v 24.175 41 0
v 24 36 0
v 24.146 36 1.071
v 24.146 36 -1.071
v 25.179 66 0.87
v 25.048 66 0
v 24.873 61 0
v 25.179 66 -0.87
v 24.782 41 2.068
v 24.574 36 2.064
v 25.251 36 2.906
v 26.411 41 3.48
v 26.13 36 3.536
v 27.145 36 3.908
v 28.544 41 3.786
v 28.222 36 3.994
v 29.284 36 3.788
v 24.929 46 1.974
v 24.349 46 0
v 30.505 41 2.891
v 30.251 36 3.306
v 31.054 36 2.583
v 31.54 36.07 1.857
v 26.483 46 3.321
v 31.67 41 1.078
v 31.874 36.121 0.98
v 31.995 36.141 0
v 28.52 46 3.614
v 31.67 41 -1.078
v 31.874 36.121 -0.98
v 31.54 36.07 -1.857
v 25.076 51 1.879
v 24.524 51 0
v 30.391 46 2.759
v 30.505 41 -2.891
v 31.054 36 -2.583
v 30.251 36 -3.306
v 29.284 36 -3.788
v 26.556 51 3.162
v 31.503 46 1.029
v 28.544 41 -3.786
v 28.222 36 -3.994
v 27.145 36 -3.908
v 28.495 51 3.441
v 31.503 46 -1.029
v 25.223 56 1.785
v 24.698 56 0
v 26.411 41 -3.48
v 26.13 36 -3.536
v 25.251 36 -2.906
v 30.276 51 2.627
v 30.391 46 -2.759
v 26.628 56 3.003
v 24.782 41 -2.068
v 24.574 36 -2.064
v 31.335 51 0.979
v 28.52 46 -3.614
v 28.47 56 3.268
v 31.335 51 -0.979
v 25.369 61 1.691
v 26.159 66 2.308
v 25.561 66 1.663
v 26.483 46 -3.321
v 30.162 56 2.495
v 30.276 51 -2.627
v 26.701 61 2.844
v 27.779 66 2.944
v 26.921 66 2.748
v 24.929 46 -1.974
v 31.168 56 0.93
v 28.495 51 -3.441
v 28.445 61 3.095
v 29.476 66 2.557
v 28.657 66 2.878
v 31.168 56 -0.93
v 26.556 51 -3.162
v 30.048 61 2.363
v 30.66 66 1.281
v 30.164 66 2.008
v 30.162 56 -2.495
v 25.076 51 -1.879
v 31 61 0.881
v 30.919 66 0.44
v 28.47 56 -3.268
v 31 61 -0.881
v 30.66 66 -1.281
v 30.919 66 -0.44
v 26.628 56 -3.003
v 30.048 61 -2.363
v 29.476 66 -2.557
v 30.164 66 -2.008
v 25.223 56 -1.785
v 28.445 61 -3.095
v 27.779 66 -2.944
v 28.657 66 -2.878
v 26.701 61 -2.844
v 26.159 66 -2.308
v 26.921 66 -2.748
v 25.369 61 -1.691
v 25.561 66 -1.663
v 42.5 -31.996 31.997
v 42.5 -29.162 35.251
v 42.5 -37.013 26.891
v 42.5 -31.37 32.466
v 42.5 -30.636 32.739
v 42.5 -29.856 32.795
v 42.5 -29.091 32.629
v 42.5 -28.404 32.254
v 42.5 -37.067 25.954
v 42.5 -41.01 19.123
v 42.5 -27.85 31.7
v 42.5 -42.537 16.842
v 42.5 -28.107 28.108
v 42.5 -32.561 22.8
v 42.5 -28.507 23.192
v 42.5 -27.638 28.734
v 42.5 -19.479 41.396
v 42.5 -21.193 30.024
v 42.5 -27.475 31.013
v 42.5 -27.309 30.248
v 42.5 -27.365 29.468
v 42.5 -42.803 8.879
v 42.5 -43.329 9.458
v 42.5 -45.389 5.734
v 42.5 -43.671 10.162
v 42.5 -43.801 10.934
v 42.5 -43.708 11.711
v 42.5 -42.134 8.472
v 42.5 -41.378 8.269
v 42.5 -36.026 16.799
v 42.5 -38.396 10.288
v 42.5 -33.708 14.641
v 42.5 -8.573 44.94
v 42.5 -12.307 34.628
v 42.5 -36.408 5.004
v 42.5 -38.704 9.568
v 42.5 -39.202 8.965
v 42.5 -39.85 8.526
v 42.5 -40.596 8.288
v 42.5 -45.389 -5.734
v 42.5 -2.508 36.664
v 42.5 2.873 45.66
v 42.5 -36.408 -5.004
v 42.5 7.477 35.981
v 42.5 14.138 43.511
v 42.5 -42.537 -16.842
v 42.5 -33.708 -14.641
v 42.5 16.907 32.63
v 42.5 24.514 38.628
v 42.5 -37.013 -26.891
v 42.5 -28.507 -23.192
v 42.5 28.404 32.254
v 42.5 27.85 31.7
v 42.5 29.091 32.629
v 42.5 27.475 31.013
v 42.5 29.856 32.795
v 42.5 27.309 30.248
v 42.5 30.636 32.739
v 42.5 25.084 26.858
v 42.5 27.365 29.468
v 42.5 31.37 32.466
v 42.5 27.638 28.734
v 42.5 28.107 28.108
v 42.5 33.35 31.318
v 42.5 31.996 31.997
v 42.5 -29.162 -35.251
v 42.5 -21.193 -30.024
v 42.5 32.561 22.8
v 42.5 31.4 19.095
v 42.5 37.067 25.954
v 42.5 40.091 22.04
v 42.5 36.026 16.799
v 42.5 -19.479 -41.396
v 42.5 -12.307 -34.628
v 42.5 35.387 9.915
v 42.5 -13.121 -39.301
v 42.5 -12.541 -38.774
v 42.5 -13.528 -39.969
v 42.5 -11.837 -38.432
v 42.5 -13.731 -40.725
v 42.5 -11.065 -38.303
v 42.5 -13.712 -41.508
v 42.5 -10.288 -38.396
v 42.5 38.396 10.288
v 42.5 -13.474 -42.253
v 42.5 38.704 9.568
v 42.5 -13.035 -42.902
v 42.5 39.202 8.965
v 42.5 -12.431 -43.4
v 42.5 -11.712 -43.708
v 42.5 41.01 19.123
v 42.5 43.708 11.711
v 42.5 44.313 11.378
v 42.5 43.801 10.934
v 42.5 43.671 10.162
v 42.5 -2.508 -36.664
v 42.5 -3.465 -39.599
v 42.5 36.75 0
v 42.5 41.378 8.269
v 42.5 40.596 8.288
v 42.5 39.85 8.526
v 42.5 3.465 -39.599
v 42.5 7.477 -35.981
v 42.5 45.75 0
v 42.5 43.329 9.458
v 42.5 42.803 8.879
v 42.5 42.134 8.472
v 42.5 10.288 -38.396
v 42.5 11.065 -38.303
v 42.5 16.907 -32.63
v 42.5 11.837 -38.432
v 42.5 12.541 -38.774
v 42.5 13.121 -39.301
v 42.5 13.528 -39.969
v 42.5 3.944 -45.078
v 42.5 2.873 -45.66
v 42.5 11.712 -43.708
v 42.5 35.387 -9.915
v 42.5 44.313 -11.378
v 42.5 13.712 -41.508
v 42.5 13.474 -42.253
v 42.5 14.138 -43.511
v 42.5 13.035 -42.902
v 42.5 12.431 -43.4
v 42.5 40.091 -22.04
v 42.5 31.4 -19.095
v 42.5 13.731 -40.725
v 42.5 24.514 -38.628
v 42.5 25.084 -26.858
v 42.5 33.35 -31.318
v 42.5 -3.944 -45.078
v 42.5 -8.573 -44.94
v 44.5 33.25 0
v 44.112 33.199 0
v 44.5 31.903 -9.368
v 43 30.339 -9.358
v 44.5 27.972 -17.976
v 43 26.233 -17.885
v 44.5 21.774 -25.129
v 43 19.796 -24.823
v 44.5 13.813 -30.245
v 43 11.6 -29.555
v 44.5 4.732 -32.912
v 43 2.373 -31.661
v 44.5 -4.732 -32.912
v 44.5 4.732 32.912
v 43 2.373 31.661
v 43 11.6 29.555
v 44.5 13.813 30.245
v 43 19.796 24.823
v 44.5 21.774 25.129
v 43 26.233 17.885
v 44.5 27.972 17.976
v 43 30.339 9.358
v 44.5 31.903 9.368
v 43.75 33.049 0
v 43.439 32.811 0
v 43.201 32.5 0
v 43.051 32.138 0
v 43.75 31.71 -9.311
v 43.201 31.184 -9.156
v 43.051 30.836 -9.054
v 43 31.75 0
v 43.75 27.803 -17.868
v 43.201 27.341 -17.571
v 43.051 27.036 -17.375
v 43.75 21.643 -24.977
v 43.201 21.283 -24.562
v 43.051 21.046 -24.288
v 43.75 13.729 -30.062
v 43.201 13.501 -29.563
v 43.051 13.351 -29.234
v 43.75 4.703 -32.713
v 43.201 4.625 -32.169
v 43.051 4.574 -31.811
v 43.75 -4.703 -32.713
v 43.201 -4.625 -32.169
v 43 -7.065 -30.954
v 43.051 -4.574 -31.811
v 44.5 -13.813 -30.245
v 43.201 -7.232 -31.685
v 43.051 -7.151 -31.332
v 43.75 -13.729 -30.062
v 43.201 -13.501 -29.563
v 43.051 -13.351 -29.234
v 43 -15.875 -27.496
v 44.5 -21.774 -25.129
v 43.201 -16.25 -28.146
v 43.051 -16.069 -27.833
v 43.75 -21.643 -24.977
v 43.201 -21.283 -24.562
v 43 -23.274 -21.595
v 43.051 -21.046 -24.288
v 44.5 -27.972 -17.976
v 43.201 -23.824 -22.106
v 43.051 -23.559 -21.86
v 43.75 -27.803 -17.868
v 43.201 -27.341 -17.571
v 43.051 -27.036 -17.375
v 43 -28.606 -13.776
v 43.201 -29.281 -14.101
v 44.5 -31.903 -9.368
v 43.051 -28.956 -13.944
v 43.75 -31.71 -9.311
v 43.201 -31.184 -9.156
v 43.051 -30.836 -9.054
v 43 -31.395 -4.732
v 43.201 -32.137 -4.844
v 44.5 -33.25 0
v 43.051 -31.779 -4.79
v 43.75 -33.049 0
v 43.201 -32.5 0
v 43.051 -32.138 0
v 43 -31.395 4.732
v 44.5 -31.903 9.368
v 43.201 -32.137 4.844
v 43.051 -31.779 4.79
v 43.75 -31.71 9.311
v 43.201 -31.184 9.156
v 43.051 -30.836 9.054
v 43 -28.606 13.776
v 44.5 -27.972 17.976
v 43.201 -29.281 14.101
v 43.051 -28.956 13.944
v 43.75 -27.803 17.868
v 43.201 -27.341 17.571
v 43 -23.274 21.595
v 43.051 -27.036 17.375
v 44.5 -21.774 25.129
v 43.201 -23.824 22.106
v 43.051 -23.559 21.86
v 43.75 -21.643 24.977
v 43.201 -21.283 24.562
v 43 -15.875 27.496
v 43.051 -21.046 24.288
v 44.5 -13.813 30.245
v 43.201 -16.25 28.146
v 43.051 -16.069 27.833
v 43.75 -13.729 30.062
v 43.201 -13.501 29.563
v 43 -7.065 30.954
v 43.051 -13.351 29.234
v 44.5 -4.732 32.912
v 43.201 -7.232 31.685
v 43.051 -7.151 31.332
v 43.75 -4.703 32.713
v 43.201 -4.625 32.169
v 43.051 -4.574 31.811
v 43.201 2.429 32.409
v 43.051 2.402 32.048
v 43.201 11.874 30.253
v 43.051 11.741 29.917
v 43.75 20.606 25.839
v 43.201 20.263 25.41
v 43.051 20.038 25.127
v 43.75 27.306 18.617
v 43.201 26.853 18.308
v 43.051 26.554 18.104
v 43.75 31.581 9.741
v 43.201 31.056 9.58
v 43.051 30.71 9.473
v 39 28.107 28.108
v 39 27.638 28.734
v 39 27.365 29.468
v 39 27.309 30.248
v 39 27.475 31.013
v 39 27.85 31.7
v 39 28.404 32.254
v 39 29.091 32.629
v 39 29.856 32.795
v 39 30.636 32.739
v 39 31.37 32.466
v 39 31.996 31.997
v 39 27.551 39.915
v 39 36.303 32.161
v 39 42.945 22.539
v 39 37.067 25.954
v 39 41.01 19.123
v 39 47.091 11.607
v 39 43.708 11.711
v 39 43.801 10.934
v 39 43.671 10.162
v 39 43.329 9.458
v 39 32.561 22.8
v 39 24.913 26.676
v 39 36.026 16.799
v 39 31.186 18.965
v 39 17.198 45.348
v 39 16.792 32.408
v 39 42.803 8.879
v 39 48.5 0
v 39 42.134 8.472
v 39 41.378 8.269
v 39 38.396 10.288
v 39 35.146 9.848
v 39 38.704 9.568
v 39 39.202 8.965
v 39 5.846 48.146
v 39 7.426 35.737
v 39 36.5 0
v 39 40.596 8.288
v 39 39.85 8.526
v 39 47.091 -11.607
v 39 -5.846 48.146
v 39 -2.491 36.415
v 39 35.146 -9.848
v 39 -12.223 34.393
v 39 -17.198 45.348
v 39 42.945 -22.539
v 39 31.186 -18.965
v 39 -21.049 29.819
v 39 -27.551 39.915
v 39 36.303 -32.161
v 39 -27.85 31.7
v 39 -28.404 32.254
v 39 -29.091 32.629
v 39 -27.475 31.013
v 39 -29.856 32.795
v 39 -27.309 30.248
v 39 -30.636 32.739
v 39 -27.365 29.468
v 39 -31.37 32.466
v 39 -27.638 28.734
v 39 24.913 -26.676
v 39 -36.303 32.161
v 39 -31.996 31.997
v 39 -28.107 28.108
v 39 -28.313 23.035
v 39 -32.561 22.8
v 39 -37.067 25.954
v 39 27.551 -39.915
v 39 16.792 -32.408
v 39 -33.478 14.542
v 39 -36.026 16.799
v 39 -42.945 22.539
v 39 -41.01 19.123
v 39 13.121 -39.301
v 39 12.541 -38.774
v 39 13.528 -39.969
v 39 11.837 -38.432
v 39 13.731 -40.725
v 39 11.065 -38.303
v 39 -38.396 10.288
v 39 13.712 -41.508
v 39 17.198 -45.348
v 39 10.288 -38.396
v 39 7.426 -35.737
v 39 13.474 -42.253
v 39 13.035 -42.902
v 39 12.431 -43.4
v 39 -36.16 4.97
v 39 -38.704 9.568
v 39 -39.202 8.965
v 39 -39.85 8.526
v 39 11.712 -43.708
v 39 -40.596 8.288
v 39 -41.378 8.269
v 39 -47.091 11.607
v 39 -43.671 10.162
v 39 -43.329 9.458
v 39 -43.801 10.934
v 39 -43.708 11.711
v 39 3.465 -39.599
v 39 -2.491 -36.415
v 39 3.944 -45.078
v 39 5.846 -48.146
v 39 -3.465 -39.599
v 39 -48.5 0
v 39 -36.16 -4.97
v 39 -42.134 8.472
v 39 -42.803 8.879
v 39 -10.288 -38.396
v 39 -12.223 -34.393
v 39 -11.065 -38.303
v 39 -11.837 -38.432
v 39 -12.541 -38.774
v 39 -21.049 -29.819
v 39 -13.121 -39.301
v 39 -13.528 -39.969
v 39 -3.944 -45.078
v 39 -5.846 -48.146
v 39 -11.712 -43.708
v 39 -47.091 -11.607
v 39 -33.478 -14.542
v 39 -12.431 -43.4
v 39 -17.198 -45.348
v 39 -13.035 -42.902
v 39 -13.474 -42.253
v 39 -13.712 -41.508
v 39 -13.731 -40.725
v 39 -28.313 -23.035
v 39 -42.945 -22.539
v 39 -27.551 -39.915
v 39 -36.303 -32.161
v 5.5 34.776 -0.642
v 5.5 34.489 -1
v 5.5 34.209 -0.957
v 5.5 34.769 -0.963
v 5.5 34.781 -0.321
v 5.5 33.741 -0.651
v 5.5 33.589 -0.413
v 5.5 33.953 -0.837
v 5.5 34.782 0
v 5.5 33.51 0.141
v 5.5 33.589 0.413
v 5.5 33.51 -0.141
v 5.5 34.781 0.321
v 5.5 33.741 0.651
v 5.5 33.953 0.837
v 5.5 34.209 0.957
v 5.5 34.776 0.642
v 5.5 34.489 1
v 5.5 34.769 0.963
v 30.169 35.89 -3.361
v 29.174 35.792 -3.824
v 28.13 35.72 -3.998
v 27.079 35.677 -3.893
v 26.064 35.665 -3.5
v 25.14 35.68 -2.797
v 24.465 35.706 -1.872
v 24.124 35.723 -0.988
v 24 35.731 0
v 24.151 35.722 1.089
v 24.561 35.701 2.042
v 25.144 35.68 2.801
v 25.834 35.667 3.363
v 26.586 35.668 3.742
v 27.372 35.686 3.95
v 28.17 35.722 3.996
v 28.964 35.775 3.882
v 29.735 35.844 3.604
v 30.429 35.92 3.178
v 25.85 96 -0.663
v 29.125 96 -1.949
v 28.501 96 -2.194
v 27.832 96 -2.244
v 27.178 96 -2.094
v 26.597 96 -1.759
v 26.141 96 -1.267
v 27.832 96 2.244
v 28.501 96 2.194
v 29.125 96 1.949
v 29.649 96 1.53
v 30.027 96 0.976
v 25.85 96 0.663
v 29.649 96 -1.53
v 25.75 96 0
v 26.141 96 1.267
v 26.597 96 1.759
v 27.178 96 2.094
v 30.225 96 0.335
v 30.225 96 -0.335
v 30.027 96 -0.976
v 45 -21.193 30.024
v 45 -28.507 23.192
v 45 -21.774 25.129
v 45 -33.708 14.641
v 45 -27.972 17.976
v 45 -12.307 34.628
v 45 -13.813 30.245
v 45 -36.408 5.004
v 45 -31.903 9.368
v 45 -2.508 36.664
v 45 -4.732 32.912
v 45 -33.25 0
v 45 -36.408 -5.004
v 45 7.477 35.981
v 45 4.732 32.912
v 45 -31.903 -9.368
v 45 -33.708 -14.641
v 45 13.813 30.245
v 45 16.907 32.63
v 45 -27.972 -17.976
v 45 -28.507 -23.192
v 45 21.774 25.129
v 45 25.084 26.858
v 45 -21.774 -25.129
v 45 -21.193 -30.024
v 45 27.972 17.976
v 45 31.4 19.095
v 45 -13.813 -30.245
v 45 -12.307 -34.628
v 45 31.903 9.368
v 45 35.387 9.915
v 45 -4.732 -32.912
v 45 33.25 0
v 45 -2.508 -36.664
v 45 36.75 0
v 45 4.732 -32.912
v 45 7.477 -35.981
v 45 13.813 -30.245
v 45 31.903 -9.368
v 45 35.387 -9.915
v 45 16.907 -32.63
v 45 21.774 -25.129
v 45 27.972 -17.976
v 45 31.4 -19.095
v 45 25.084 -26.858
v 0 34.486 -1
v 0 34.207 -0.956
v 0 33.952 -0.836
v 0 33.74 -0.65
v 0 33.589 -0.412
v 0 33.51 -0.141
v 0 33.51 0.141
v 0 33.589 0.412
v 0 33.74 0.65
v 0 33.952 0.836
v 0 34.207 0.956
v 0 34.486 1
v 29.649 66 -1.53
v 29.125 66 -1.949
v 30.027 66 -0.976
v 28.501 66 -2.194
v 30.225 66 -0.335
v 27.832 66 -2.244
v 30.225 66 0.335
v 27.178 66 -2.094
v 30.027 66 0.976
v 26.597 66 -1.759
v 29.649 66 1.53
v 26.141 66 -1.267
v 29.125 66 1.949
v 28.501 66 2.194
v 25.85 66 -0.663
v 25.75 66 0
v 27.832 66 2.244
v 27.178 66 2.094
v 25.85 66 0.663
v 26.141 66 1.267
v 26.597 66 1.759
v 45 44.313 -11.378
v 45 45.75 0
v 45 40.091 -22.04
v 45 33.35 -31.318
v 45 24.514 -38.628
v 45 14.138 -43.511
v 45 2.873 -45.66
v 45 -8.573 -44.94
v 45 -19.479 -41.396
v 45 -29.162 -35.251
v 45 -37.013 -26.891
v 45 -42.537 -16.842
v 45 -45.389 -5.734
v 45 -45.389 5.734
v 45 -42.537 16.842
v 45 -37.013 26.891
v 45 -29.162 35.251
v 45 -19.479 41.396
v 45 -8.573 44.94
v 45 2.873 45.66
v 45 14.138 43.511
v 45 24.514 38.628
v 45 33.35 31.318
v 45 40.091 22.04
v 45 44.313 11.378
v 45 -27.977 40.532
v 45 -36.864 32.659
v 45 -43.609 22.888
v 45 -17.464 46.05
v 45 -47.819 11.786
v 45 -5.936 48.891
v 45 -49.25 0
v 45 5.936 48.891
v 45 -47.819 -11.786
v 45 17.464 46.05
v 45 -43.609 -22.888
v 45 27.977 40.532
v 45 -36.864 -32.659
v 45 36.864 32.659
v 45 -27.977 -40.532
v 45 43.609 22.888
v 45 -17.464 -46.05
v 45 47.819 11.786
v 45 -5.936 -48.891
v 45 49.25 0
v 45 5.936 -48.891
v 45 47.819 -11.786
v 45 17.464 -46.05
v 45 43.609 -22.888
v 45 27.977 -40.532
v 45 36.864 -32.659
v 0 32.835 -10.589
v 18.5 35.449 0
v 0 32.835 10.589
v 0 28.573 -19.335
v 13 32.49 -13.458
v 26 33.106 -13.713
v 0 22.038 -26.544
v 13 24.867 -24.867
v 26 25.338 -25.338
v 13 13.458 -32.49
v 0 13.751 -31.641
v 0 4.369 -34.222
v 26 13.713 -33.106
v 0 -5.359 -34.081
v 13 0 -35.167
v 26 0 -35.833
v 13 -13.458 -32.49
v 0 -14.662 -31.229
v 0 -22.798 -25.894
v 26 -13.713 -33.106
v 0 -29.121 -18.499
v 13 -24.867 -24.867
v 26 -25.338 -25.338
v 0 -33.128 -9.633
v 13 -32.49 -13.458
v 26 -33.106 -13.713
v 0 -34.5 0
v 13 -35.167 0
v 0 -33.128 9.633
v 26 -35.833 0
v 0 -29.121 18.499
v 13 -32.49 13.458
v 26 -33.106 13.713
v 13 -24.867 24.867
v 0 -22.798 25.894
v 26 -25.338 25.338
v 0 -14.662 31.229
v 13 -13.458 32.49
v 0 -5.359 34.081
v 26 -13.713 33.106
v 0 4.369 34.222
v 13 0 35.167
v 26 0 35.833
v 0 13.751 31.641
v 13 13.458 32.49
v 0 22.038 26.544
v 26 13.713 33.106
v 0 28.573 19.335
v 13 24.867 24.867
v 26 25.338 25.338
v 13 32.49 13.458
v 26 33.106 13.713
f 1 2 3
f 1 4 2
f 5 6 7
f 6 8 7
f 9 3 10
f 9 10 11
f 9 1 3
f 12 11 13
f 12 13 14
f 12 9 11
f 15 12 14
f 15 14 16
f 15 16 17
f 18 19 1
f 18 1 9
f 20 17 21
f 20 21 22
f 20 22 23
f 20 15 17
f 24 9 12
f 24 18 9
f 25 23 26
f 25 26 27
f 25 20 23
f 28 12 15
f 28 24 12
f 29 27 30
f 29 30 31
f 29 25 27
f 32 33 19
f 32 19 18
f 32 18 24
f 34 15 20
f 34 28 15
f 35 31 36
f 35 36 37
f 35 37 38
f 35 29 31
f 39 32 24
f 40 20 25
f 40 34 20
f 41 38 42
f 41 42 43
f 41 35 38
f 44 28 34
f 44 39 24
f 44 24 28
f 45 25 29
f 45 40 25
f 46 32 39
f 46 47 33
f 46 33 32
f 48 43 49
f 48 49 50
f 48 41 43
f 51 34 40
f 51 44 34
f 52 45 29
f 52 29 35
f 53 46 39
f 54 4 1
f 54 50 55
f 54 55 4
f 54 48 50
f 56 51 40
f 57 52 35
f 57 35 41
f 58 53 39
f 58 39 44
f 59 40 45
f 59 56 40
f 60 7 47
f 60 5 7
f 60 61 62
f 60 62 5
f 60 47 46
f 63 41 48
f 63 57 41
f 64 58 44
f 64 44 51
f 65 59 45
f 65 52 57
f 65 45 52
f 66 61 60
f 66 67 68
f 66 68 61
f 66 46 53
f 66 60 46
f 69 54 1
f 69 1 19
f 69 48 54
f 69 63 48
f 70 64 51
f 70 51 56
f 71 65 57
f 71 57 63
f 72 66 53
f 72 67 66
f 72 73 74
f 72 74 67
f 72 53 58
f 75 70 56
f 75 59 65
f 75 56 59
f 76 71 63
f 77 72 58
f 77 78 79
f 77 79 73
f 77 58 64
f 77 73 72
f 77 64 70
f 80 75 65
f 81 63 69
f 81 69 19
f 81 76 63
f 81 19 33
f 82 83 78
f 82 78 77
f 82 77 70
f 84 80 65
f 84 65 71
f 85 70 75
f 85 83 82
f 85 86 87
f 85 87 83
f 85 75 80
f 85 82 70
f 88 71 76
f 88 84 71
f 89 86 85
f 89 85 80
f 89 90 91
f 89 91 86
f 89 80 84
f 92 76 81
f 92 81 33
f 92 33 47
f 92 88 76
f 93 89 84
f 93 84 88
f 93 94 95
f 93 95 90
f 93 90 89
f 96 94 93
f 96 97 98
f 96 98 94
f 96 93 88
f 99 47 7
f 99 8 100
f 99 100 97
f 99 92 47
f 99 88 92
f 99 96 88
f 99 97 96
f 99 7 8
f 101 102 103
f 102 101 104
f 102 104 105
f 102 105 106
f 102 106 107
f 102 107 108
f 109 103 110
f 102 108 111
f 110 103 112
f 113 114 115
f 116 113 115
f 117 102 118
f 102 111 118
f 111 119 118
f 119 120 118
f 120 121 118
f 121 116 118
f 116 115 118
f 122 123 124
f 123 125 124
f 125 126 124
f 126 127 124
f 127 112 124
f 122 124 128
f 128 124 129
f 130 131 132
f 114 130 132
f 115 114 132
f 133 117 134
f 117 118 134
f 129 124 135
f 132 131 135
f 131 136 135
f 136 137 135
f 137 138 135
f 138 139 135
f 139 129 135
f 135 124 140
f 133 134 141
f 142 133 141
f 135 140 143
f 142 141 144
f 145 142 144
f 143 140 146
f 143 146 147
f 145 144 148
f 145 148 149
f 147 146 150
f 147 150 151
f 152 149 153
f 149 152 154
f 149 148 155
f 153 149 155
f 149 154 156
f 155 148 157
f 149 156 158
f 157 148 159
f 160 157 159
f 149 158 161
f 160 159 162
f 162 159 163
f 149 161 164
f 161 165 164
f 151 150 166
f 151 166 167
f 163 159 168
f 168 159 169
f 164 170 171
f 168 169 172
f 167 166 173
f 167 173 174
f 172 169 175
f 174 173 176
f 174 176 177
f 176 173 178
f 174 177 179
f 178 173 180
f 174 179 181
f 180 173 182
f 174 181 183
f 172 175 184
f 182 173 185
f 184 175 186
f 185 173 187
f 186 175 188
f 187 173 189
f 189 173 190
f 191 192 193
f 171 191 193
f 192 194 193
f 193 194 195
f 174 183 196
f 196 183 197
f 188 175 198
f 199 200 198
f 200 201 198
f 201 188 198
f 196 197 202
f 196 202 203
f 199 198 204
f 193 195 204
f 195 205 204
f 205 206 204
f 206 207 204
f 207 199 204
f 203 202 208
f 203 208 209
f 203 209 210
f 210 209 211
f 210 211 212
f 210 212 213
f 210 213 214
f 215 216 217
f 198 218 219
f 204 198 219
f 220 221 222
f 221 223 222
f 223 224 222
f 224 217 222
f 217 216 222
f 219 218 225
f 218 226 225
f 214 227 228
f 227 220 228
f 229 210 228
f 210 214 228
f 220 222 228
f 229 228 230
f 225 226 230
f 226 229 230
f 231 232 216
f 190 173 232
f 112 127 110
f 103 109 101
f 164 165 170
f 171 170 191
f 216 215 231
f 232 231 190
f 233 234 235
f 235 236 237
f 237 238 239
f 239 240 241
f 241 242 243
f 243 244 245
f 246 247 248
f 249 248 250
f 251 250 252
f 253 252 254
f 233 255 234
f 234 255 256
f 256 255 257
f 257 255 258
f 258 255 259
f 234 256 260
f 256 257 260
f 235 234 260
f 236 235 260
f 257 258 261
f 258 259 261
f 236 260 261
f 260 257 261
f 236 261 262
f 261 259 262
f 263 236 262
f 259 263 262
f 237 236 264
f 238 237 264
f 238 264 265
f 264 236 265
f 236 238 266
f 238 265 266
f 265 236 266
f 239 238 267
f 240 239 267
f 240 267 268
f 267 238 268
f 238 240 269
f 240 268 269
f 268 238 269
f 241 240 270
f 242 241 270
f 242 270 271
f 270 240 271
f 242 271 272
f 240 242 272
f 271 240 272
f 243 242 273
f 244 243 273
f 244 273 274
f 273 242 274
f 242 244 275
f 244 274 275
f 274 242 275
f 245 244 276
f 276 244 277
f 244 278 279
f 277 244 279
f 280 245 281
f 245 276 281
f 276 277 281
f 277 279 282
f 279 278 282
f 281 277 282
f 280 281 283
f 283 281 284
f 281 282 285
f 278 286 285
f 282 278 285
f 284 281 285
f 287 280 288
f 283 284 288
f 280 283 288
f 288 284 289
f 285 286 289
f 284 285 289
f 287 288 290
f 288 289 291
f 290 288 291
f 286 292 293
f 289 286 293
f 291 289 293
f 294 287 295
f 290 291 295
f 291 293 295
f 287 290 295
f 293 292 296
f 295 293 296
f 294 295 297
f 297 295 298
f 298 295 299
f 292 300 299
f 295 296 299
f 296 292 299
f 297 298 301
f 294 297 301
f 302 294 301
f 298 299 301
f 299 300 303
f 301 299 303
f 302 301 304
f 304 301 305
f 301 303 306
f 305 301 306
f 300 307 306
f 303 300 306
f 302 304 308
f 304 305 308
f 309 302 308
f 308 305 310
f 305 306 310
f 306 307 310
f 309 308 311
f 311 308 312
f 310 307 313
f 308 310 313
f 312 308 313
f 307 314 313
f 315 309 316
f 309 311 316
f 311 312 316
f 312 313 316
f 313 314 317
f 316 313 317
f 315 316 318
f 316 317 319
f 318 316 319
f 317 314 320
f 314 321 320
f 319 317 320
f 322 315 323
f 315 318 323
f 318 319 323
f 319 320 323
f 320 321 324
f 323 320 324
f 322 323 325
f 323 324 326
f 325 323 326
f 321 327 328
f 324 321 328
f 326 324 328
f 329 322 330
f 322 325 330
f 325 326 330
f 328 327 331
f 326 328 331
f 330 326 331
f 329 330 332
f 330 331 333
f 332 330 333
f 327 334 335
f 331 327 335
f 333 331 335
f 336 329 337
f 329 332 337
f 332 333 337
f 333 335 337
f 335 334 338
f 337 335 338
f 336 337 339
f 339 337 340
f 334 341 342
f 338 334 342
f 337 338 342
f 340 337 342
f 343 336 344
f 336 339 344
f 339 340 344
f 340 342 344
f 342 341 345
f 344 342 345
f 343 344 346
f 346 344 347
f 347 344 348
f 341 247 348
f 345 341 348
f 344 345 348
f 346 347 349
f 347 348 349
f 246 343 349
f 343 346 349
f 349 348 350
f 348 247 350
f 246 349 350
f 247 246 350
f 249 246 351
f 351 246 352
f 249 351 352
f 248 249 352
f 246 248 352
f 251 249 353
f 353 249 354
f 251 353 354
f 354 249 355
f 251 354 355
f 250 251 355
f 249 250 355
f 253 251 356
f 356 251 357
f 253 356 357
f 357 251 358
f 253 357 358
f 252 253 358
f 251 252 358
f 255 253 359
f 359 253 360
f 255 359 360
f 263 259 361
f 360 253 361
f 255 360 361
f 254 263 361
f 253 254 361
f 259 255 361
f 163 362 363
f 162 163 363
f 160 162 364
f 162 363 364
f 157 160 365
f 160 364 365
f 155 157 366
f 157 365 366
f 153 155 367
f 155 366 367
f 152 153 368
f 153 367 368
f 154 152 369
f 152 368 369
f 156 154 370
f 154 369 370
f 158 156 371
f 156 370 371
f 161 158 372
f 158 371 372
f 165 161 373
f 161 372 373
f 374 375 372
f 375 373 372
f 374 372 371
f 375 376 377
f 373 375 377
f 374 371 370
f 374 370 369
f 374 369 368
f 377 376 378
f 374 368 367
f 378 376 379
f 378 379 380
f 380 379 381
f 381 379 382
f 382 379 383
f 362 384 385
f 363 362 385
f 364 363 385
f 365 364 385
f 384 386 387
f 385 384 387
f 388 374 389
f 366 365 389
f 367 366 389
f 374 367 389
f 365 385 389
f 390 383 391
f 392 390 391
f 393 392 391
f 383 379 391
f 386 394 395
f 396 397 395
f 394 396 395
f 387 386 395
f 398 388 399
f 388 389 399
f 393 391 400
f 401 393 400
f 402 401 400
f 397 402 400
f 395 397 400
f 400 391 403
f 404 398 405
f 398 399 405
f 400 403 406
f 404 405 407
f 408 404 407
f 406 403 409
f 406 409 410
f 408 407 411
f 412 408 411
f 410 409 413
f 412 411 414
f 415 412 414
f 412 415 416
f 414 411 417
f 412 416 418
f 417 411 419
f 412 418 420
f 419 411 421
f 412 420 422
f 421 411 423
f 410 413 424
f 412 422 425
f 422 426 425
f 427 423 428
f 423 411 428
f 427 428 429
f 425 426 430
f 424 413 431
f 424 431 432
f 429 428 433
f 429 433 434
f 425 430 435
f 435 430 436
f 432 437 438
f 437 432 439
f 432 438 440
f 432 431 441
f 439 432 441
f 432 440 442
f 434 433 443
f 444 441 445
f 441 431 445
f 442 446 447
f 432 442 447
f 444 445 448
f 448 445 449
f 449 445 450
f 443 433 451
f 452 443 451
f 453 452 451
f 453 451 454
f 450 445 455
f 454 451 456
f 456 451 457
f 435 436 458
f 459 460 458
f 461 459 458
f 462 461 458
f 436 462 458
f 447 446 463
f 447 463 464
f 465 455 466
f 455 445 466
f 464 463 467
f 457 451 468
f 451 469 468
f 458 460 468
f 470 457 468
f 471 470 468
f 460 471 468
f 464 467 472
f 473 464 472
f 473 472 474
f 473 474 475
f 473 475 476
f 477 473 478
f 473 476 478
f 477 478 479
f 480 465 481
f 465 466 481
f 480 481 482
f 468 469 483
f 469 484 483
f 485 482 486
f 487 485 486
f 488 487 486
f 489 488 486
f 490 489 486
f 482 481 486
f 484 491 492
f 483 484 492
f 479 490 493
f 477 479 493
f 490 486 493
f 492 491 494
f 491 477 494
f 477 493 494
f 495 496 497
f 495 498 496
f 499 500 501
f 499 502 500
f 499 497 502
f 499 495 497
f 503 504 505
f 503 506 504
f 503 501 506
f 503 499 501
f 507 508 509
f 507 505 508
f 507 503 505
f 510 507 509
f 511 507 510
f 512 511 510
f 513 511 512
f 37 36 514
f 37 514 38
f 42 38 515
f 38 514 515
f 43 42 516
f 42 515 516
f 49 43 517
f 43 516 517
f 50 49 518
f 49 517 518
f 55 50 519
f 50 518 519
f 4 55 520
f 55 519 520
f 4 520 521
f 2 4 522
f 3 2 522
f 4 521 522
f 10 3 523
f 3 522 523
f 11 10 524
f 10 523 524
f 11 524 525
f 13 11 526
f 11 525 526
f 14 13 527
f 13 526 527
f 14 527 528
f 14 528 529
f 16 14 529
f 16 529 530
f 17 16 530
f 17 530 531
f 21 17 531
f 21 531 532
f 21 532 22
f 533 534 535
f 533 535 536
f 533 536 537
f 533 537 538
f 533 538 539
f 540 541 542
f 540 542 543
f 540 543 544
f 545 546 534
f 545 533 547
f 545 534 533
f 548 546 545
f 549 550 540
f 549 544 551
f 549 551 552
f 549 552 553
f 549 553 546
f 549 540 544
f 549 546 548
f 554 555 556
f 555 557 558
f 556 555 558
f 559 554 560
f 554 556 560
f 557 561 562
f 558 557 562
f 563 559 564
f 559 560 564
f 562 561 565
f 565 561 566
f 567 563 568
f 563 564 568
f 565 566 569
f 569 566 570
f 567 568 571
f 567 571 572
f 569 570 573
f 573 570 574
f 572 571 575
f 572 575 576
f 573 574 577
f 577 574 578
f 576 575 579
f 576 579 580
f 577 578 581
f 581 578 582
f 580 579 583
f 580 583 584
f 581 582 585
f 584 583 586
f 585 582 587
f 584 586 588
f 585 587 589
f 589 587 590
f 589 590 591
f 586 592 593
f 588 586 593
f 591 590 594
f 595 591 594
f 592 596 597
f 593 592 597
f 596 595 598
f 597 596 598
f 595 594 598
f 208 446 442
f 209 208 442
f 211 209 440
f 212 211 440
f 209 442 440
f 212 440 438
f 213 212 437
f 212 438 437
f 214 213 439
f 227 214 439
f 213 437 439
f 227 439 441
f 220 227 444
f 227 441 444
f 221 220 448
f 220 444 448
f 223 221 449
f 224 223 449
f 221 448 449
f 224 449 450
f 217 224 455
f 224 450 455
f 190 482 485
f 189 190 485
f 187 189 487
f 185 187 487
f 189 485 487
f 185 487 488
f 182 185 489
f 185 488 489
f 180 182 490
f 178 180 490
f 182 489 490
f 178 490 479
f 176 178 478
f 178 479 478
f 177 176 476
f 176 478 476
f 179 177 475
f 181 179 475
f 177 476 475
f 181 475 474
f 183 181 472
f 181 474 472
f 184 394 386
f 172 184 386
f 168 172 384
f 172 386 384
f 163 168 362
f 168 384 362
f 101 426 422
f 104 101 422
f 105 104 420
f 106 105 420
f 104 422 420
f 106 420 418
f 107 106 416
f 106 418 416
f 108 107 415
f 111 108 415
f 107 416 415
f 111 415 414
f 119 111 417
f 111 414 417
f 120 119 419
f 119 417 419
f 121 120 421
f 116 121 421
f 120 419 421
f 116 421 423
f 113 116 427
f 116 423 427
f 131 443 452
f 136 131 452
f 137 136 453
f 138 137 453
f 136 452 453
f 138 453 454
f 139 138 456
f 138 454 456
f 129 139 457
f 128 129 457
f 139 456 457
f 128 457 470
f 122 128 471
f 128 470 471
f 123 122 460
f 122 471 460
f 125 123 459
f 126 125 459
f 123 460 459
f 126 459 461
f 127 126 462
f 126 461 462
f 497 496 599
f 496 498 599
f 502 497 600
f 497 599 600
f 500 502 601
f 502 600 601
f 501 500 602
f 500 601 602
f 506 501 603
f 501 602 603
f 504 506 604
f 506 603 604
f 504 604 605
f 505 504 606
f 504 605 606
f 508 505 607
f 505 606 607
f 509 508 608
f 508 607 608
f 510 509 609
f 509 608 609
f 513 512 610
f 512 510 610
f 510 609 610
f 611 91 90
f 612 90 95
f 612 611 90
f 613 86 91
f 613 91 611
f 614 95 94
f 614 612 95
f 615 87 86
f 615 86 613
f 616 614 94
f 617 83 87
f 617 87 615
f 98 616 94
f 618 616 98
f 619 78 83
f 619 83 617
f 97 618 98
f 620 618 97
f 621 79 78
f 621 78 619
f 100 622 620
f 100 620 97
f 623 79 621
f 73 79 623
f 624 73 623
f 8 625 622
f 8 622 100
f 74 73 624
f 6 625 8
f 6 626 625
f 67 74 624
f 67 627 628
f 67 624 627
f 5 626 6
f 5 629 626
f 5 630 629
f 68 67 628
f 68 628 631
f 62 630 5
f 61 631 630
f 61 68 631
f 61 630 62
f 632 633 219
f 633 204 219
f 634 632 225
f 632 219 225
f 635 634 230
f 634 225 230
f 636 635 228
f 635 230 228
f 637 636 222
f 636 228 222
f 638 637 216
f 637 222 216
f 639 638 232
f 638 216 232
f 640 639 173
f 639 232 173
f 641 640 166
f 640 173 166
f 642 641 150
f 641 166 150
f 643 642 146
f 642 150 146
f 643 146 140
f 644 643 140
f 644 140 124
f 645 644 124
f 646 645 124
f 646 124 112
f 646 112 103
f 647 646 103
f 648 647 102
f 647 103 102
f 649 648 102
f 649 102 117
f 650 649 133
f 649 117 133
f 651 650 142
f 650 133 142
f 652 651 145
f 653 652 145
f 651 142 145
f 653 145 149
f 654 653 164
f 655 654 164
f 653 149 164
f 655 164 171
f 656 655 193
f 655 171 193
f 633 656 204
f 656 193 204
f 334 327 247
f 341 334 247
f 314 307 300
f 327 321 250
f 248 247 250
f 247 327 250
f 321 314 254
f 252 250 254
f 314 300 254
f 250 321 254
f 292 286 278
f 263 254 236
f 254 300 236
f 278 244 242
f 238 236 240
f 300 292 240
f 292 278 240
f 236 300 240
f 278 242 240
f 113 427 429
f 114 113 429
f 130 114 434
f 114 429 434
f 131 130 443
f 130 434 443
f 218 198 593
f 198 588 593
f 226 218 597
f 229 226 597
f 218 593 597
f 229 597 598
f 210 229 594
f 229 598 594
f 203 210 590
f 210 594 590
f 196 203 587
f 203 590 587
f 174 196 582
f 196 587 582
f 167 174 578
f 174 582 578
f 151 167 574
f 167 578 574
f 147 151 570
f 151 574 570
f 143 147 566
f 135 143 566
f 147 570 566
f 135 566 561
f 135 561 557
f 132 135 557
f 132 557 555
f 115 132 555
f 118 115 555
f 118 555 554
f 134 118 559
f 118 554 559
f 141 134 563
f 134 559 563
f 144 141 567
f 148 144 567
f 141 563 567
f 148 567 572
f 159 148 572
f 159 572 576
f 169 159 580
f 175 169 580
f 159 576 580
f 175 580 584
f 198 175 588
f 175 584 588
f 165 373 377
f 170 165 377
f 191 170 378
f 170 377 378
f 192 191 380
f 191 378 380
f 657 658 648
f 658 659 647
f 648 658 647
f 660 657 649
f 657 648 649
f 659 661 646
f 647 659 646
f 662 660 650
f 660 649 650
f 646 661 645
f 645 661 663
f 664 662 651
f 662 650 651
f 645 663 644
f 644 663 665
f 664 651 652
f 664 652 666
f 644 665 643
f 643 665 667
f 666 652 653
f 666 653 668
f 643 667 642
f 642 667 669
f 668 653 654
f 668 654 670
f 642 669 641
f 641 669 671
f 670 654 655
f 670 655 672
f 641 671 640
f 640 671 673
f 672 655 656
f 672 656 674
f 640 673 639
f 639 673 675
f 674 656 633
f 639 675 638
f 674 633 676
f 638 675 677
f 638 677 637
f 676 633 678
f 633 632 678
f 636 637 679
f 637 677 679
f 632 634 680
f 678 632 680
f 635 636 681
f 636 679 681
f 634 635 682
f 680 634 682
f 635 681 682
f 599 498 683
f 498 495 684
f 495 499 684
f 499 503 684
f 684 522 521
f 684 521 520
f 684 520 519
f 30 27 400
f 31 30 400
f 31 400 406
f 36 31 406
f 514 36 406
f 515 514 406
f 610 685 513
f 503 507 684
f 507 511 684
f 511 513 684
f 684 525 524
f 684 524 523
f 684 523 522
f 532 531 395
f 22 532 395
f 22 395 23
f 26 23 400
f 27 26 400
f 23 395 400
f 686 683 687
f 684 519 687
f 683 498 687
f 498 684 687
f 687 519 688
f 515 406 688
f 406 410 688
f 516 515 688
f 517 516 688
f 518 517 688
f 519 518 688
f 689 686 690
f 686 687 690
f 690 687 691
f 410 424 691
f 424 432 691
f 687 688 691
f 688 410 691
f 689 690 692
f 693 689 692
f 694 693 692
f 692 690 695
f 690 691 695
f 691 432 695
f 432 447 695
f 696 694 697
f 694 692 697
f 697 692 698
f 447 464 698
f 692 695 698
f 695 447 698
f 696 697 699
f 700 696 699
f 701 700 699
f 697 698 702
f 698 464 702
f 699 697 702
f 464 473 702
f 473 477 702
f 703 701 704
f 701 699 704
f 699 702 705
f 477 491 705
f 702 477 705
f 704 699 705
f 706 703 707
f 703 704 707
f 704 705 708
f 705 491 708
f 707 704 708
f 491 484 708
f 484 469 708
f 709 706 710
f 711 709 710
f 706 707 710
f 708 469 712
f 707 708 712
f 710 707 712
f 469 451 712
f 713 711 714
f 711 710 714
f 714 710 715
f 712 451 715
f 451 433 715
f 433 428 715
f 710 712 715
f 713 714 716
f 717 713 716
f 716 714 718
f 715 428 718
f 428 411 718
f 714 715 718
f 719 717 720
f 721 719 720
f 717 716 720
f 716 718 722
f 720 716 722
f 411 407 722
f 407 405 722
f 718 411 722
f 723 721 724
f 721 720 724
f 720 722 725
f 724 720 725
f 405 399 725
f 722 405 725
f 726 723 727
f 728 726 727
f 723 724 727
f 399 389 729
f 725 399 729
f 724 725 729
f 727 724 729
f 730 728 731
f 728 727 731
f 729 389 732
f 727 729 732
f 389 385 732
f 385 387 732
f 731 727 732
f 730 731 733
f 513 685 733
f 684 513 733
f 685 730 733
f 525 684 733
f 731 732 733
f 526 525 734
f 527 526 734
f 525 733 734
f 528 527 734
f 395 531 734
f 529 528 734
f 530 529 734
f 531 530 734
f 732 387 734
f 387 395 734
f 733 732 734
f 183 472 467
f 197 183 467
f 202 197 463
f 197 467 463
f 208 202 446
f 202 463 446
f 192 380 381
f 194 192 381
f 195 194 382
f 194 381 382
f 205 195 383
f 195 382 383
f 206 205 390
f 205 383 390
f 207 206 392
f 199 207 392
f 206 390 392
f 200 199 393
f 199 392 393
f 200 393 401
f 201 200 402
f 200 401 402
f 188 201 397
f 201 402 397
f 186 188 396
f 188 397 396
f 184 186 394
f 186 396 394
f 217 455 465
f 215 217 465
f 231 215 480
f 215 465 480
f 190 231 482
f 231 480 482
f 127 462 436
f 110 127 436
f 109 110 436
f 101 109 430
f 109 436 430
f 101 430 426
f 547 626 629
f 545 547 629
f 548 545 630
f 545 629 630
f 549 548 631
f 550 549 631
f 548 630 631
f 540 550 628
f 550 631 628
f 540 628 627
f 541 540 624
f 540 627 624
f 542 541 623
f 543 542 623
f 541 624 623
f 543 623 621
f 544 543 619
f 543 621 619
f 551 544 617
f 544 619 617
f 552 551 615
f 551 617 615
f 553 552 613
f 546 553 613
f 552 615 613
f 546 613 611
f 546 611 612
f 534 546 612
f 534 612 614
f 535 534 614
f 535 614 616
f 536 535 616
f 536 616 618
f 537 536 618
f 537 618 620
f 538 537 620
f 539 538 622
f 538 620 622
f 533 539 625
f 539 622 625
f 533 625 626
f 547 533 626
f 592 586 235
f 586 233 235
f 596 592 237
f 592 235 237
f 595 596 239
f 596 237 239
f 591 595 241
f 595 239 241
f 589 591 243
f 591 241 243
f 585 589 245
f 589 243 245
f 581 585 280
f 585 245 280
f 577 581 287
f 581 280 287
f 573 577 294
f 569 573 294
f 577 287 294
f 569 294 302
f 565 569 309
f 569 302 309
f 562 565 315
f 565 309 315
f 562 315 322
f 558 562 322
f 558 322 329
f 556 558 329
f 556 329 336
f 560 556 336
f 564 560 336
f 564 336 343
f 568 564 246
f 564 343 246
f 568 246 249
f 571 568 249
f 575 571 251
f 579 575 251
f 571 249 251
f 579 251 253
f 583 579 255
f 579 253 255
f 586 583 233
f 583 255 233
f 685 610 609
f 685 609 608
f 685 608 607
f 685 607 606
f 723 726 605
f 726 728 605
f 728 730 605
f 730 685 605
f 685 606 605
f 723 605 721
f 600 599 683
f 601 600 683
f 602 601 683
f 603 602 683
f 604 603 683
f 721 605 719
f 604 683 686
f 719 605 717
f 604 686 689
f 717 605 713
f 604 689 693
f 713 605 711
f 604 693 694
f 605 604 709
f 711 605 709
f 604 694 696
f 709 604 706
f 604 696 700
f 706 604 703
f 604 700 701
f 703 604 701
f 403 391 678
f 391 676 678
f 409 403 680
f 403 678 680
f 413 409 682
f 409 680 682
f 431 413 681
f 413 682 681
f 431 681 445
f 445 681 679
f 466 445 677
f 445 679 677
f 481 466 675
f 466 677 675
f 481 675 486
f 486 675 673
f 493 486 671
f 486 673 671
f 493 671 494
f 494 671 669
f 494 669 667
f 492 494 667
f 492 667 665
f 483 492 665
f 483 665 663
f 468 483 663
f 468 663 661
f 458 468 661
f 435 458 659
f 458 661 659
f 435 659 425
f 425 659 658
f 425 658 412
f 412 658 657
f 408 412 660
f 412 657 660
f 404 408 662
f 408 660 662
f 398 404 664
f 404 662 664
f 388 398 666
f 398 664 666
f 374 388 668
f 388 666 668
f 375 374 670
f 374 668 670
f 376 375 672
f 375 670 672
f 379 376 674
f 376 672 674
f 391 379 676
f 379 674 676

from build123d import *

# Parameters (mm, degrees)
ESQUISSE2_R                  = 1
ENL_V_MAT_EXTRU_1_DEPTH      = 5.5
ESQUISSE3_R                  = 4
EXTRUSION1_DEPTH             = 36
ESQUISSE4_R                  = 4
EXTRUSION2_DEPTH             = 30
EXTRUSION2_TAPER             = 2
ESQUISSE5_R                  = 2.25
EXTRUSION3_DEPTH             = 30
ENL_V_MAT_EXTRU_2_DEPTH      = 7
R_P_TITION_CIRCULAIRE1_COUNT = 3


with BuildPart() as part:
    # Esquisse1 → Révolution1 (revolve)
    with BuildSketch(Plane.XY):
        with BuildLine():
            Line((0, 0), (0, 34.5))
            Line((0, 34.5), (39, 36.5))
            Line((39, 36.5), (39, 48.5))
            Line((39, 48.5), (45, 49.25))
            Line((45, 49.25), (45, 45.75))
            Line((45, 45.75), (42.5, 45.75))
            Line((42.5, 45.75), (42.5, 36.75))
            Line((42.5, 36.75), (45, 36.75))
            Line((45, 36.75), (45, 33.25))
            Line((45, 33.25), (44.5, 33.25))
            ThreePointArc((44.5, 33.25), (43.439339828, 32.810660172), (43, 31.75))
            Line((43, 31.75), (43, 0))
            Line((43, 0), (0, 0))
        make_face()
    revolve(axis=Axis((104.922362869, 0, 0), (-1, 0, 0)))

    # Esquisse2 → Enlèv. mat.-Extru.1 (cut)
    with BuildSketch(Plane.ZY):
        with Locations((0, 34.5)):
            Circle(ESQUISSE2_R)
    extrude(amount=-ENL_V_MAT_EXTRU_1_DEPTH, mode=Mode.SUBTRACT)

    # Esquisse3 → Extrusion1 (add)
    with BuildSketch(Plane(origin=(0, 0, 0), x_dir=(1, 0, 0), z_dir=(0, 1, 0))):
        with Locations((28, 0)):
            Circle(ESQUISSE3_R)
    extrude(amount=EXTRUSION1_DEPTH)

    # Esquisse4 → Extrusion2 (add)
    with BuildSketch(Plane(origin=(0, 36, 0), x_dir=(-1, 0, 0), z_dir=(0, 1, 0))):
        with Locations((-28, 0)):
            Circle(ESQUISSE4_R)
    extrude(amount=EXTRUSION2_DEPTH, taper=EXTRUSION2_TAPER)

    # Esquisse5 → Extrusion3 (add)
    with BuildSketch(Plane(origin=(0, 66, 0), x_dir=(-1, 0, 0), z_dir=(0, 1, 0))):
        with Locations((-28, 0)):
            Circle(ESQUISSE5_R)
    extrude(amount=EXTRUSION3_DEPTH)

    # Esquisse6 → Enlèv. mat.-Extru.2 (cut, through all)
    with BuildSketch(Plane.ZY.offset(-39)):
        with BuildLine():
            ThreePointArc((-38.395503832, 10.288235294), (-40.340031844, 13.656292718), (-43.708089268, 11.711764706))
            ThreePointArc((-43.708089268, 11.711764706), (-45.25, 0), (-43.708089268, -11.711764706))
            ThreePointArc((-43.708089268, -11.711764706), (-40.340031844, -13.656292718), (-38.395503832, -10.288235294))
            ThreePointArc((-38.395503832, -10.288235294), (-39.75, 0), (-38.395503832, 10.288235294))
        make_face()
    enl_v_mat_extru_2 = extrude(amount=-ENL_V_MAT_EXTRU_2_DEPTH, mode=Mode.SUBTRACT)

    # Répétition circulaire1: Enlèv. mat.-Extru.2 ×3 about axis
    r_p_tition_circulaire1_axis = Axis((39, 0, 0), (-1, 0, 0))
    for i in range(1, R_P_TITION_CIRCULAIRE1_COUNT):
        add(enl_v_mat_extru_2.rotate(r_p_tition_circulaire1_axis, i * 360 / R_P_TITION_CIRCULAIRE1_COUNT), mode=Mode.SUBTRACT)


solid = part.part
